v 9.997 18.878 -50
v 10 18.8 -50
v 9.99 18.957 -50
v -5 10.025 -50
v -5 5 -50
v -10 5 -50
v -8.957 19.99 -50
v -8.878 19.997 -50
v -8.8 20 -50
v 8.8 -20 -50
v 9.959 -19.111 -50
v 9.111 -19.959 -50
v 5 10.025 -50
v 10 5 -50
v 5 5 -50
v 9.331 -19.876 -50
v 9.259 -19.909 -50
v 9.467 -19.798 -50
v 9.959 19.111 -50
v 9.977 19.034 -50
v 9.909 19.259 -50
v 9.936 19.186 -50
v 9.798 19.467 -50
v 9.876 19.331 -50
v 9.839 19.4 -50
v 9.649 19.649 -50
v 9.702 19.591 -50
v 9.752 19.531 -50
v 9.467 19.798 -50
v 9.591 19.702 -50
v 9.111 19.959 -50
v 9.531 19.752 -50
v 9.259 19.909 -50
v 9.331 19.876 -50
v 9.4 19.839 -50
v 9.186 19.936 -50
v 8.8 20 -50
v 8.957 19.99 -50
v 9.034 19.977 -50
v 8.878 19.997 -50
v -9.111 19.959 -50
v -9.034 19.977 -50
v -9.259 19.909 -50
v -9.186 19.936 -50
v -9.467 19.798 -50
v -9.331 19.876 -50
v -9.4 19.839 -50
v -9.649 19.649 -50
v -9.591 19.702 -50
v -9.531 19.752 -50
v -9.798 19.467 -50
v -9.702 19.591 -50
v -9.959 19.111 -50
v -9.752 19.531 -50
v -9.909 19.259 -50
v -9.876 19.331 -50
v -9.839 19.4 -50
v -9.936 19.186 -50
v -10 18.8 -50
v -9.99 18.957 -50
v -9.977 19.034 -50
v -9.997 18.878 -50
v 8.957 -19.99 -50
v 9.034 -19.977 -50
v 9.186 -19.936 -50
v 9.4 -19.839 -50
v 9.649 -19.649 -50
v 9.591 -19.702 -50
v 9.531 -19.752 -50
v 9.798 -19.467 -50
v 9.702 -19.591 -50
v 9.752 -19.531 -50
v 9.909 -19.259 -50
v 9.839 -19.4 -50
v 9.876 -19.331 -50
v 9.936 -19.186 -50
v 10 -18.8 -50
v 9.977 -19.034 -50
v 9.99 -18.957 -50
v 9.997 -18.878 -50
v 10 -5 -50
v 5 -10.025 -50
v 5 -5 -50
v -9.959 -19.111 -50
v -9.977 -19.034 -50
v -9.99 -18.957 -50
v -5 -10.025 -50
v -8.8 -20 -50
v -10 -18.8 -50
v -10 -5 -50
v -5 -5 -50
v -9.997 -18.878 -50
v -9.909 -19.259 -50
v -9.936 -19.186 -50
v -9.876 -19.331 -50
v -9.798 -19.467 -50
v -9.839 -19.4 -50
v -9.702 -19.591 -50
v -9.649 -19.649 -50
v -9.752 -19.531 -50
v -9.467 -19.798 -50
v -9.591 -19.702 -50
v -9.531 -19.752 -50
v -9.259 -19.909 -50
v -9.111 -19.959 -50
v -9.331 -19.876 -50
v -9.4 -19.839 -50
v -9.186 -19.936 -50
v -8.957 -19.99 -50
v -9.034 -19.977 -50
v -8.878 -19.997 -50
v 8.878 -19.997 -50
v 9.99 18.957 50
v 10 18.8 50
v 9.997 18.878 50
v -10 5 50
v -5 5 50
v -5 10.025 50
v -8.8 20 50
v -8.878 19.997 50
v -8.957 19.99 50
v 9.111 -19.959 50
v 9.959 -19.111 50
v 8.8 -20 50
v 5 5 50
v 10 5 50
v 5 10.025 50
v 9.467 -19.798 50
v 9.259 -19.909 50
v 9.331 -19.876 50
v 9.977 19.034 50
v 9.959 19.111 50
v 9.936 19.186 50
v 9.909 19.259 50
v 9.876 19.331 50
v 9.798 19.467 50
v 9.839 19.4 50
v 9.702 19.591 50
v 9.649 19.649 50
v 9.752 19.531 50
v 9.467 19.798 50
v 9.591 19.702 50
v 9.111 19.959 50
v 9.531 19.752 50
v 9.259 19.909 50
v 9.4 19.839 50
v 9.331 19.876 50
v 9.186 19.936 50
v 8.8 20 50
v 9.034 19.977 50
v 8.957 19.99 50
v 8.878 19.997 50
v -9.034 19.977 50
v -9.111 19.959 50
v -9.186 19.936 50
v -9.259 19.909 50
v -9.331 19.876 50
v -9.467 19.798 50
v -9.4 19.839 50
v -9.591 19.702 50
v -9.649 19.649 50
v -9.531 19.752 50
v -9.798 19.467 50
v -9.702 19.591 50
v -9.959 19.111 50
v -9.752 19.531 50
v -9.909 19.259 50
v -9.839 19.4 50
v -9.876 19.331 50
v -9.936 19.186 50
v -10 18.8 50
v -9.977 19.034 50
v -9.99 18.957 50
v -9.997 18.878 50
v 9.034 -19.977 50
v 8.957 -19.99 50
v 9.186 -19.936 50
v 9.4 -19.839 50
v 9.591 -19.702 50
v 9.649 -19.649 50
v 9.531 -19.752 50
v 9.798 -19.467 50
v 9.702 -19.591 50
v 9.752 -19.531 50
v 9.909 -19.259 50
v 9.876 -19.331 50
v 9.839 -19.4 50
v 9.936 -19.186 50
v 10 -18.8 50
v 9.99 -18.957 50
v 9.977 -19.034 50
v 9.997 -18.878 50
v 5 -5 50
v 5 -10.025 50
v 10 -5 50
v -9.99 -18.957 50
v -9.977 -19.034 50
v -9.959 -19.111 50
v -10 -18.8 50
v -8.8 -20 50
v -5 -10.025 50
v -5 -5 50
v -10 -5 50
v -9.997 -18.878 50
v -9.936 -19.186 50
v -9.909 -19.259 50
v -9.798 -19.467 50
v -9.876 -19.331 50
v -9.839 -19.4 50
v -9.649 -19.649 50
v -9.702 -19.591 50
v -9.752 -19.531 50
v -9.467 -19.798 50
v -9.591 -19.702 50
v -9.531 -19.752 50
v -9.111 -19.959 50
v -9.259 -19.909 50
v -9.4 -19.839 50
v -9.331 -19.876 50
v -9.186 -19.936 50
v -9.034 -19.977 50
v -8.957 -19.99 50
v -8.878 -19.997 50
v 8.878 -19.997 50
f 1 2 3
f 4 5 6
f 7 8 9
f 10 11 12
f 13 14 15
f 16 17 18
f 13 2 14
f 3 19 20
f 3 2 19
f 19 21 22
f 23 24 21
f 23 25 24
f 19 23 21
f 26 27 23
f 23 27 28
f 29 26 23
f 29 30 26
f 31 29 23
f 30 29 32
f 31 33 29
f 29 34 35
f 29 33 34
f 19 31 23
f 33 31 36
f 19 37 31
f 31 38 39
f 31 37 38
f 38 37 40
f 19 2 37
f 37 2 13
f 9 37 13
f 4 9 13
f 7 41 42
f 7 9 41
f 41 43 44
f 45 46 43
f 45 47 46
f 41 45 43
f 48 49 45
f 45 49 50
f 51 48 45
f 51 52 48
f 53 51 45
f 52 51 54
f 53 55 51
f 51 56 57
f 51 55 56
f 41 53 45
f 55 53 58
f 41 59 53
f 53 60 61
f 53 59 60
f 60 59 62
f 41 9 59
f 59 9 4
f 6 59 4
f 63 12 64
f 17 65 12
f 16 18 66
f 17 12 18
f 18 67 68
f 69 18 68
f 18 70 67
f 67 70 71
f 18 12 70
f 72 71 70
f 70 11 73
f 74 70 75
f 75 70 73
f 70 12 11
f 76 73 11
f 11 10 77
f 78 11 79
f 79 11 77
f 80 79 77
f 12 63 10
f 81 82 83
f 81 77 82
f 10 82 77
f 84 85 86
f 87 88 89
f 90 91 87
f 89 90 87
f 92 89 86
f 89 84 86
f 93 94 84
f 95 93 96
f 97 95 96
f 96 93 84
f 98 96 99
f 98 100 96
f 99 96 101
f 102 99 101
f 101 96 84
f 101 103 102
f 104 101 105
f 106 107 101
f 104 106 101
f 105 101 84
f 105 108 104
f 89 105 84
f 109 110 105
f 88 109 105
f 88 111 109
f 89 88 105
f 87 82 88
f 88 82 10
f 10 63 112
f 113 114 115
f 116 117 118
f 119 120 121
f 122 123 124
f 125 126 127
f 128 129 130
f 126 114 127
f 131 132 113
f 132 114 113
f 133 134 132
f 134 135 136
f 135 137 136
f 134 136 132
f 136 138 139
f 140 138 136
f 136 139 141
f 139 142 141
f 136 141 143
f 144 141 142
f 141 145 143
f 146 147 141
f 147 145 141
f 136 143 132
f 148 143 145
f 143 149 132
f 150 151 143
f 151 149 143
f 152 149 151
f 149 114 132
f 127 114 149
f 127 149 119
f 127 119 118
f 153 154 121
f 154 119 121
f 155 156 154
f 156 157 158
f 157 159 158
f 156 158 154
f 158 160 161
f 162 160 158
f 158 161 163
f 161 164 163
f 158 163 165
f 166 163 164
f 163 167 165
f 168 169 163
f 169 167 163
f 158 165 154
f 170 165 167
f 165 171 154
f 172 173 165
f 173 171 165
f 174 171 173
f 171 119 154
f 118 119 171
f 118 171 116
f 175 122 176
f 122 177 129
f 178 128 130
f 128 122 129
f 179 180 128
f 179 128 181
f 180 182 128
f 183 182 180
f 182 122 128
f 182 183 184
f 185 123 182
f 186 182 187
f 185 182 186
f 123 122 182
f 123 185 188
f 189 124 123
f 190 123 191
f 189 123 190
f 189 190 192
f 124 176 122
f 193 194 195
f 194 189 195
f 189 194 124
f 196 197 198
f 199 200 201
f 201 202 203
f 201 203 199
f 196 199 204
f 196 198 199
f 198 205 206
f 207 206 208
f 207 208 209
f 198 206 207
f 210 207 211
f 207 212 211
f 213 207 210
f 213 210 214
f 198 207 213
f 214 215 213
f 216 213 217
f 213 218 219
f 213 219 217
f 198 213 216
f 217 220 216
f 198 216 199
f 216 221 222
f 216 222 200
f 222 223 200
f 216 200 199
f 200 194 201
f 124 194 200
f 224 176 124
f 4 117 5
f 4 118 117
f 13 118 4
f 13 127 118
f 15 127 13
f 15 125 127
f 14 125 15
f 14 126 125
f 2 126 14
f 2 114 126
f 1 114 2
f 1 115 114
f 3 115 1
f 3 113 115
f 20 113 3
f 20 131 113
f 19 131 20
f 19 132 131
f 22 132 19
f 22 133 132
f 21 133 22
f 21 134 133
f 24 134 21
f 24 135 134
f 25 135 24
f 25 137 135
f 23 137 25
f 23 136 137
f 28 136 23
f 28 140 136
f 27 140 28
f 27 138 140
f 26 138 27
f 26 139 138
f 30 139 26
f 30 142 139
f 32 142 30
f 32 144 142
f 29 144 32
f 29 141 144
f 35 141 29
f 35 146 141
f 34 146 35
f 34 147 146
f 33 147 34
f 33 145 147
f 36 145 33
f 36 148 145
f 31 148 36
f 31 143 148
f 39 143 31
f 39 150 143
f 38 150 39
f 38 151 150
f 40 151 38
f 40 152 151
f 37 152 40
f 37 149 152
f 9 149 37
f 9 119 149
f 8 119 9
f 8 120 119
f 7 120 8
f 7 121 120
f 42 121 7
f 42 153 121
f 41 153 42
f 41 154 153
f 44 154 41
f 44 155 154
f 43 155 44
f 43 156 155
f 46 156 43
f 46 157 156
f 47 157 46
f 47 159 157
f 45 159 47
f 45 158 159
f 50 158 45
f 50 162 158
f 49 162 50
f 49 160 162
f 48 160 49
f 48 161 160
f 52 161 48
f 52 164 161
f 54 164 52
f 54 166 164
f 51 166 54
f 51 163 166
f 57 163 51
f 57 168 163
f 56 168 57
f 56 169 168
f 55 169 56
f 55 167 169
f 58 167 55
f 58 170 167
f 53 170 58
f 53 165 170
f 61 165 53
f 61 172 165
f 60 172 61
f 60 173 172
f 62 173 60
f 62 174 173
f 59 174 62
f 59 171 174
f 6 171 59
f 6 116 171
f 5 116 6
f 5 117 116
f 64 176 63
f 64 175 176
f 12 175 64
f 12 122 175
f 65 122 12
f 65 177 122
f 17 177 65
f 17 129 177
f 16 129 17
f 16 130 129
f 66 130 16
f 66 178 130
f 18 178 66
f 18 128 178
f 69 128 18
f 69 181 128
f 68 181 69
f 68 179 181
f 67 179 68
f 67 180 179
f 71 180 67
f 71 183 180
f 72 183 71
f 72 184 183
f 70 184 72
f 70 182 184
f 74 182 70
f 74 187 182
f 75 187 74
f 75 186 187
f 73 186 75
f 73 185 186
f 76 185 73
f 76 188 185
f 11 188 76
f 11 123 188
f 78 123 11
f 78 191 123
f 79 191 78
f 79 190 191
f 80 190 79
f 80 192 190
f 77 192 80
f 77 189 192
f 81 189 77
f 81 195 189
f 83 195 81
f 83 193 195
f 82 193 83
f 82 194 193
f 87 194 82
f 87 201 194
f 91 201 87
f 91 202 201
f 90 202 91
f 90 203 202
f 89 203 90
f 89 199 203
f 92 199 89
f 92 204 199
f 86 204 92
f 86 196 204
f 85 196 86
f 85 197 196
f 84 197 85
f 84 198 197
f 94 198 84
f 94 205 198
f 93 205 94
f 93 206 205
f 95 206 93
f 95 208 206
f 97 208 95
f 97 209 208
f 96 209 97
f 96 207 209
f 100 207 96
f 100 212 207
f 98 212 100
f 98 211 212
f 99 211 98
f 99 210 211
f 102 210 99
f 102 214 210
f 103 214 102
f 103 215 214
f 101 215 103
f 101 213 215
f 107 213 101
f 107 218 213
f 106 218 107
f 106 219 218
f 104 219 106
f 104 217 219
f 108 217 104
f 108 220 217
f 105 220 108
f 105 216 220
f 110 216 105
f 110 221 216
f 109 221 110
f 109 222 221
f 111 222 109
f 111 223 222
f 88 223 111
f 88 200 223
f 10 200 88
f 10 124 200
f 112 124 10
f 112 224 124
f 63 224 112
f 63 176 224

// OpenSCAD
$fn = 96;

// Aluminium extrusion profile, 20x40mm cross-section, 100mm long
// STRUCTURAL FIX: ensure the profile is ONE connected solid by adding
// internal "tie" bridges that physically connect upper/lower and left/right
// regions with 1–2mm guaranteed overlap, so boolean slot cutouts cannot split it.

// Parameters
cross_section_width_mm  = 20.0;   // X
cross_section_height_mm = 40.0;   // Y
length_mm               = 100.0;  // Z

corner_radius_mm        = 1.2;

// T-slot (simplified 2040 style)
slot_opening_mm         = 6.2;    // mouth width at outer face
slot_depth_mm           = 6.5;    // depth from outer face to cavity start
slot_cavity_width_mm    = 10.0;   // internal cavity width
slot_cavity_depth_mm    = 3.5;    // additional depth beyond slot_depth

// Internal features
center_bore_diameter_mm = 5.2;    // typical center bore
web_thickness_mm        = 2.0;    // minimum web thickness target

// Small overlap to avoid coincident faces in boolean ops
eps = 0.05;

// Connectivity overlap (1-2mm) to guarantee attachment
overlap_mm = 1.5;

// 2D rounded rectangle helper
module rounded_rect_2d(w, h, r) {
    r2 = min(r, min(w, h)/2 - eps);
    offset(r=r2) square([w-2*r2, h-2*r2], center=true);
}

// 2D cross-section of a 2040 extrusion (forced single connected solid)
module extrusion_profile_2d() {
    w = cross_section_width_mm;
    h = cross_section_height_mm;

    // Clamp slot geometry to stay inside profile
    max_inset = min(w, h)/2 - 0.8; // keep some material no matter what
    slot_d = min(slot_depth_mm, max_inset);
    cav_d  = min(slot_cavity_depth_mm, max(0, max_inset - slot_d));

    bore_r = center_bore_diameter_mm/2;

    // --- STRUCTURAL FIX: add internal tie bridges that CROSS the centerlines ---
    // These bridges are part of the SOLID before subtracting voids.
    // They are placed so they do NOT intersect the center bore, but still
    // overlap across the would-be split lines by overlap_mm.
    bridge_th = max(web_thickness_mm, 2.0);

    // Keep bridges inside rounded corners
    bridge_len_x = w - 2*(corner_radius_mm + 1.0);
    bridge_len_y = h - 2*(corner_radius_mm + 1.0);

    // Place bridges just outside the bore, but ensure they still cross the
    // centerlines (x=0 and y=0) by overlap_mm.
    // Condition: offset + bridge_th/2 > overlap_mm  (so it crosses the centerline)
    // and offset - bridge_th/2 >= bore_r + eps      (so it clears the bore)
    bridge_offset = max(
        bore_r + bridge_th/2 + eps,
        overlap_mm - bridge_th/2 + eps
    );

    difference() {
        // SOLID: outer body + bridges (single connected body)
        union() {
            rounded_rect_2d(w, h, corner_radius_mm);

            // Horizontal ties (connect left/right halves): bars above and below bore
            translate([0,  bridge_offset]) square([bridge_len_x, bridge_th], center=true);
            translate([0, -bridge_offset]) square([bridge_len_x, bridge_th], center=true);

            // Vertical ties (connect upper/lower halves): bars left and right of bore
            translate([ bridge_offset, 0]) square([bridge_th, bridge_len_y], center=true);
            translate([-bridge_offset, 0]) square([bridge_th, bridge_len_y], center=true);

            // Extra central cross-ties to eliminate any residual "gap" caused by
            // slot/cavity subtractions in front/back and left/right views.
            // These are thin but guaranteed to overlap across both centerlines.
            // They are also kept clear of the bore by using the same offset logic.
            cross_len_x = max(bridge_th, 2*overlap_mm + bridge_th);
            cross_len_y = max(bridge_th, 2*overlap_mm + bridge_th);

            // Two short vertical stubs crossing y=0 (connect upper/lower)
            translate([ bridge_offset, 0]) square([bridge_th, cross_len_y], center=true);
            translate([-bridge_offset, 0]) square([bridge_th, cross_len_y], center=true);

            // Two short horizontal stubs crossing x=0 (connect left/right)
            translate([0,  bridge_offset]) square([cross_len_x, bridge_th], center=true);
            translate([0, -bridge_offset]) square([cross_len_x, bridge_th], center=true);
        }

        // T-slots: 4 sides (mouth + cavity), rotated around center
        for (a = [0, 90, 180, 270]) rotate(a) {
            // Slot mouth (near outer face)
            translate([w/2 - slot_d/2, 0])
                square([slot_d + eps, slot_opening_mm], center=true);

            // Slot cavity (deeper and wider)
            translate([w/2 - (slot_d + cav_d)/2, 0])
                square([slot_d + cav_d + eps, slot_cavity_width_mm], center=true);
        }

        // Center bore
        circle(r=bore_r);
    }
}

// 3D extrusion
module extrusion_2040() {
    color("Silver")
    union() {
        linear_extrude(height=length_mm, center=true, convexity=10)
            extrusion_profile_2d();
    }
}

extrusion_2040();
